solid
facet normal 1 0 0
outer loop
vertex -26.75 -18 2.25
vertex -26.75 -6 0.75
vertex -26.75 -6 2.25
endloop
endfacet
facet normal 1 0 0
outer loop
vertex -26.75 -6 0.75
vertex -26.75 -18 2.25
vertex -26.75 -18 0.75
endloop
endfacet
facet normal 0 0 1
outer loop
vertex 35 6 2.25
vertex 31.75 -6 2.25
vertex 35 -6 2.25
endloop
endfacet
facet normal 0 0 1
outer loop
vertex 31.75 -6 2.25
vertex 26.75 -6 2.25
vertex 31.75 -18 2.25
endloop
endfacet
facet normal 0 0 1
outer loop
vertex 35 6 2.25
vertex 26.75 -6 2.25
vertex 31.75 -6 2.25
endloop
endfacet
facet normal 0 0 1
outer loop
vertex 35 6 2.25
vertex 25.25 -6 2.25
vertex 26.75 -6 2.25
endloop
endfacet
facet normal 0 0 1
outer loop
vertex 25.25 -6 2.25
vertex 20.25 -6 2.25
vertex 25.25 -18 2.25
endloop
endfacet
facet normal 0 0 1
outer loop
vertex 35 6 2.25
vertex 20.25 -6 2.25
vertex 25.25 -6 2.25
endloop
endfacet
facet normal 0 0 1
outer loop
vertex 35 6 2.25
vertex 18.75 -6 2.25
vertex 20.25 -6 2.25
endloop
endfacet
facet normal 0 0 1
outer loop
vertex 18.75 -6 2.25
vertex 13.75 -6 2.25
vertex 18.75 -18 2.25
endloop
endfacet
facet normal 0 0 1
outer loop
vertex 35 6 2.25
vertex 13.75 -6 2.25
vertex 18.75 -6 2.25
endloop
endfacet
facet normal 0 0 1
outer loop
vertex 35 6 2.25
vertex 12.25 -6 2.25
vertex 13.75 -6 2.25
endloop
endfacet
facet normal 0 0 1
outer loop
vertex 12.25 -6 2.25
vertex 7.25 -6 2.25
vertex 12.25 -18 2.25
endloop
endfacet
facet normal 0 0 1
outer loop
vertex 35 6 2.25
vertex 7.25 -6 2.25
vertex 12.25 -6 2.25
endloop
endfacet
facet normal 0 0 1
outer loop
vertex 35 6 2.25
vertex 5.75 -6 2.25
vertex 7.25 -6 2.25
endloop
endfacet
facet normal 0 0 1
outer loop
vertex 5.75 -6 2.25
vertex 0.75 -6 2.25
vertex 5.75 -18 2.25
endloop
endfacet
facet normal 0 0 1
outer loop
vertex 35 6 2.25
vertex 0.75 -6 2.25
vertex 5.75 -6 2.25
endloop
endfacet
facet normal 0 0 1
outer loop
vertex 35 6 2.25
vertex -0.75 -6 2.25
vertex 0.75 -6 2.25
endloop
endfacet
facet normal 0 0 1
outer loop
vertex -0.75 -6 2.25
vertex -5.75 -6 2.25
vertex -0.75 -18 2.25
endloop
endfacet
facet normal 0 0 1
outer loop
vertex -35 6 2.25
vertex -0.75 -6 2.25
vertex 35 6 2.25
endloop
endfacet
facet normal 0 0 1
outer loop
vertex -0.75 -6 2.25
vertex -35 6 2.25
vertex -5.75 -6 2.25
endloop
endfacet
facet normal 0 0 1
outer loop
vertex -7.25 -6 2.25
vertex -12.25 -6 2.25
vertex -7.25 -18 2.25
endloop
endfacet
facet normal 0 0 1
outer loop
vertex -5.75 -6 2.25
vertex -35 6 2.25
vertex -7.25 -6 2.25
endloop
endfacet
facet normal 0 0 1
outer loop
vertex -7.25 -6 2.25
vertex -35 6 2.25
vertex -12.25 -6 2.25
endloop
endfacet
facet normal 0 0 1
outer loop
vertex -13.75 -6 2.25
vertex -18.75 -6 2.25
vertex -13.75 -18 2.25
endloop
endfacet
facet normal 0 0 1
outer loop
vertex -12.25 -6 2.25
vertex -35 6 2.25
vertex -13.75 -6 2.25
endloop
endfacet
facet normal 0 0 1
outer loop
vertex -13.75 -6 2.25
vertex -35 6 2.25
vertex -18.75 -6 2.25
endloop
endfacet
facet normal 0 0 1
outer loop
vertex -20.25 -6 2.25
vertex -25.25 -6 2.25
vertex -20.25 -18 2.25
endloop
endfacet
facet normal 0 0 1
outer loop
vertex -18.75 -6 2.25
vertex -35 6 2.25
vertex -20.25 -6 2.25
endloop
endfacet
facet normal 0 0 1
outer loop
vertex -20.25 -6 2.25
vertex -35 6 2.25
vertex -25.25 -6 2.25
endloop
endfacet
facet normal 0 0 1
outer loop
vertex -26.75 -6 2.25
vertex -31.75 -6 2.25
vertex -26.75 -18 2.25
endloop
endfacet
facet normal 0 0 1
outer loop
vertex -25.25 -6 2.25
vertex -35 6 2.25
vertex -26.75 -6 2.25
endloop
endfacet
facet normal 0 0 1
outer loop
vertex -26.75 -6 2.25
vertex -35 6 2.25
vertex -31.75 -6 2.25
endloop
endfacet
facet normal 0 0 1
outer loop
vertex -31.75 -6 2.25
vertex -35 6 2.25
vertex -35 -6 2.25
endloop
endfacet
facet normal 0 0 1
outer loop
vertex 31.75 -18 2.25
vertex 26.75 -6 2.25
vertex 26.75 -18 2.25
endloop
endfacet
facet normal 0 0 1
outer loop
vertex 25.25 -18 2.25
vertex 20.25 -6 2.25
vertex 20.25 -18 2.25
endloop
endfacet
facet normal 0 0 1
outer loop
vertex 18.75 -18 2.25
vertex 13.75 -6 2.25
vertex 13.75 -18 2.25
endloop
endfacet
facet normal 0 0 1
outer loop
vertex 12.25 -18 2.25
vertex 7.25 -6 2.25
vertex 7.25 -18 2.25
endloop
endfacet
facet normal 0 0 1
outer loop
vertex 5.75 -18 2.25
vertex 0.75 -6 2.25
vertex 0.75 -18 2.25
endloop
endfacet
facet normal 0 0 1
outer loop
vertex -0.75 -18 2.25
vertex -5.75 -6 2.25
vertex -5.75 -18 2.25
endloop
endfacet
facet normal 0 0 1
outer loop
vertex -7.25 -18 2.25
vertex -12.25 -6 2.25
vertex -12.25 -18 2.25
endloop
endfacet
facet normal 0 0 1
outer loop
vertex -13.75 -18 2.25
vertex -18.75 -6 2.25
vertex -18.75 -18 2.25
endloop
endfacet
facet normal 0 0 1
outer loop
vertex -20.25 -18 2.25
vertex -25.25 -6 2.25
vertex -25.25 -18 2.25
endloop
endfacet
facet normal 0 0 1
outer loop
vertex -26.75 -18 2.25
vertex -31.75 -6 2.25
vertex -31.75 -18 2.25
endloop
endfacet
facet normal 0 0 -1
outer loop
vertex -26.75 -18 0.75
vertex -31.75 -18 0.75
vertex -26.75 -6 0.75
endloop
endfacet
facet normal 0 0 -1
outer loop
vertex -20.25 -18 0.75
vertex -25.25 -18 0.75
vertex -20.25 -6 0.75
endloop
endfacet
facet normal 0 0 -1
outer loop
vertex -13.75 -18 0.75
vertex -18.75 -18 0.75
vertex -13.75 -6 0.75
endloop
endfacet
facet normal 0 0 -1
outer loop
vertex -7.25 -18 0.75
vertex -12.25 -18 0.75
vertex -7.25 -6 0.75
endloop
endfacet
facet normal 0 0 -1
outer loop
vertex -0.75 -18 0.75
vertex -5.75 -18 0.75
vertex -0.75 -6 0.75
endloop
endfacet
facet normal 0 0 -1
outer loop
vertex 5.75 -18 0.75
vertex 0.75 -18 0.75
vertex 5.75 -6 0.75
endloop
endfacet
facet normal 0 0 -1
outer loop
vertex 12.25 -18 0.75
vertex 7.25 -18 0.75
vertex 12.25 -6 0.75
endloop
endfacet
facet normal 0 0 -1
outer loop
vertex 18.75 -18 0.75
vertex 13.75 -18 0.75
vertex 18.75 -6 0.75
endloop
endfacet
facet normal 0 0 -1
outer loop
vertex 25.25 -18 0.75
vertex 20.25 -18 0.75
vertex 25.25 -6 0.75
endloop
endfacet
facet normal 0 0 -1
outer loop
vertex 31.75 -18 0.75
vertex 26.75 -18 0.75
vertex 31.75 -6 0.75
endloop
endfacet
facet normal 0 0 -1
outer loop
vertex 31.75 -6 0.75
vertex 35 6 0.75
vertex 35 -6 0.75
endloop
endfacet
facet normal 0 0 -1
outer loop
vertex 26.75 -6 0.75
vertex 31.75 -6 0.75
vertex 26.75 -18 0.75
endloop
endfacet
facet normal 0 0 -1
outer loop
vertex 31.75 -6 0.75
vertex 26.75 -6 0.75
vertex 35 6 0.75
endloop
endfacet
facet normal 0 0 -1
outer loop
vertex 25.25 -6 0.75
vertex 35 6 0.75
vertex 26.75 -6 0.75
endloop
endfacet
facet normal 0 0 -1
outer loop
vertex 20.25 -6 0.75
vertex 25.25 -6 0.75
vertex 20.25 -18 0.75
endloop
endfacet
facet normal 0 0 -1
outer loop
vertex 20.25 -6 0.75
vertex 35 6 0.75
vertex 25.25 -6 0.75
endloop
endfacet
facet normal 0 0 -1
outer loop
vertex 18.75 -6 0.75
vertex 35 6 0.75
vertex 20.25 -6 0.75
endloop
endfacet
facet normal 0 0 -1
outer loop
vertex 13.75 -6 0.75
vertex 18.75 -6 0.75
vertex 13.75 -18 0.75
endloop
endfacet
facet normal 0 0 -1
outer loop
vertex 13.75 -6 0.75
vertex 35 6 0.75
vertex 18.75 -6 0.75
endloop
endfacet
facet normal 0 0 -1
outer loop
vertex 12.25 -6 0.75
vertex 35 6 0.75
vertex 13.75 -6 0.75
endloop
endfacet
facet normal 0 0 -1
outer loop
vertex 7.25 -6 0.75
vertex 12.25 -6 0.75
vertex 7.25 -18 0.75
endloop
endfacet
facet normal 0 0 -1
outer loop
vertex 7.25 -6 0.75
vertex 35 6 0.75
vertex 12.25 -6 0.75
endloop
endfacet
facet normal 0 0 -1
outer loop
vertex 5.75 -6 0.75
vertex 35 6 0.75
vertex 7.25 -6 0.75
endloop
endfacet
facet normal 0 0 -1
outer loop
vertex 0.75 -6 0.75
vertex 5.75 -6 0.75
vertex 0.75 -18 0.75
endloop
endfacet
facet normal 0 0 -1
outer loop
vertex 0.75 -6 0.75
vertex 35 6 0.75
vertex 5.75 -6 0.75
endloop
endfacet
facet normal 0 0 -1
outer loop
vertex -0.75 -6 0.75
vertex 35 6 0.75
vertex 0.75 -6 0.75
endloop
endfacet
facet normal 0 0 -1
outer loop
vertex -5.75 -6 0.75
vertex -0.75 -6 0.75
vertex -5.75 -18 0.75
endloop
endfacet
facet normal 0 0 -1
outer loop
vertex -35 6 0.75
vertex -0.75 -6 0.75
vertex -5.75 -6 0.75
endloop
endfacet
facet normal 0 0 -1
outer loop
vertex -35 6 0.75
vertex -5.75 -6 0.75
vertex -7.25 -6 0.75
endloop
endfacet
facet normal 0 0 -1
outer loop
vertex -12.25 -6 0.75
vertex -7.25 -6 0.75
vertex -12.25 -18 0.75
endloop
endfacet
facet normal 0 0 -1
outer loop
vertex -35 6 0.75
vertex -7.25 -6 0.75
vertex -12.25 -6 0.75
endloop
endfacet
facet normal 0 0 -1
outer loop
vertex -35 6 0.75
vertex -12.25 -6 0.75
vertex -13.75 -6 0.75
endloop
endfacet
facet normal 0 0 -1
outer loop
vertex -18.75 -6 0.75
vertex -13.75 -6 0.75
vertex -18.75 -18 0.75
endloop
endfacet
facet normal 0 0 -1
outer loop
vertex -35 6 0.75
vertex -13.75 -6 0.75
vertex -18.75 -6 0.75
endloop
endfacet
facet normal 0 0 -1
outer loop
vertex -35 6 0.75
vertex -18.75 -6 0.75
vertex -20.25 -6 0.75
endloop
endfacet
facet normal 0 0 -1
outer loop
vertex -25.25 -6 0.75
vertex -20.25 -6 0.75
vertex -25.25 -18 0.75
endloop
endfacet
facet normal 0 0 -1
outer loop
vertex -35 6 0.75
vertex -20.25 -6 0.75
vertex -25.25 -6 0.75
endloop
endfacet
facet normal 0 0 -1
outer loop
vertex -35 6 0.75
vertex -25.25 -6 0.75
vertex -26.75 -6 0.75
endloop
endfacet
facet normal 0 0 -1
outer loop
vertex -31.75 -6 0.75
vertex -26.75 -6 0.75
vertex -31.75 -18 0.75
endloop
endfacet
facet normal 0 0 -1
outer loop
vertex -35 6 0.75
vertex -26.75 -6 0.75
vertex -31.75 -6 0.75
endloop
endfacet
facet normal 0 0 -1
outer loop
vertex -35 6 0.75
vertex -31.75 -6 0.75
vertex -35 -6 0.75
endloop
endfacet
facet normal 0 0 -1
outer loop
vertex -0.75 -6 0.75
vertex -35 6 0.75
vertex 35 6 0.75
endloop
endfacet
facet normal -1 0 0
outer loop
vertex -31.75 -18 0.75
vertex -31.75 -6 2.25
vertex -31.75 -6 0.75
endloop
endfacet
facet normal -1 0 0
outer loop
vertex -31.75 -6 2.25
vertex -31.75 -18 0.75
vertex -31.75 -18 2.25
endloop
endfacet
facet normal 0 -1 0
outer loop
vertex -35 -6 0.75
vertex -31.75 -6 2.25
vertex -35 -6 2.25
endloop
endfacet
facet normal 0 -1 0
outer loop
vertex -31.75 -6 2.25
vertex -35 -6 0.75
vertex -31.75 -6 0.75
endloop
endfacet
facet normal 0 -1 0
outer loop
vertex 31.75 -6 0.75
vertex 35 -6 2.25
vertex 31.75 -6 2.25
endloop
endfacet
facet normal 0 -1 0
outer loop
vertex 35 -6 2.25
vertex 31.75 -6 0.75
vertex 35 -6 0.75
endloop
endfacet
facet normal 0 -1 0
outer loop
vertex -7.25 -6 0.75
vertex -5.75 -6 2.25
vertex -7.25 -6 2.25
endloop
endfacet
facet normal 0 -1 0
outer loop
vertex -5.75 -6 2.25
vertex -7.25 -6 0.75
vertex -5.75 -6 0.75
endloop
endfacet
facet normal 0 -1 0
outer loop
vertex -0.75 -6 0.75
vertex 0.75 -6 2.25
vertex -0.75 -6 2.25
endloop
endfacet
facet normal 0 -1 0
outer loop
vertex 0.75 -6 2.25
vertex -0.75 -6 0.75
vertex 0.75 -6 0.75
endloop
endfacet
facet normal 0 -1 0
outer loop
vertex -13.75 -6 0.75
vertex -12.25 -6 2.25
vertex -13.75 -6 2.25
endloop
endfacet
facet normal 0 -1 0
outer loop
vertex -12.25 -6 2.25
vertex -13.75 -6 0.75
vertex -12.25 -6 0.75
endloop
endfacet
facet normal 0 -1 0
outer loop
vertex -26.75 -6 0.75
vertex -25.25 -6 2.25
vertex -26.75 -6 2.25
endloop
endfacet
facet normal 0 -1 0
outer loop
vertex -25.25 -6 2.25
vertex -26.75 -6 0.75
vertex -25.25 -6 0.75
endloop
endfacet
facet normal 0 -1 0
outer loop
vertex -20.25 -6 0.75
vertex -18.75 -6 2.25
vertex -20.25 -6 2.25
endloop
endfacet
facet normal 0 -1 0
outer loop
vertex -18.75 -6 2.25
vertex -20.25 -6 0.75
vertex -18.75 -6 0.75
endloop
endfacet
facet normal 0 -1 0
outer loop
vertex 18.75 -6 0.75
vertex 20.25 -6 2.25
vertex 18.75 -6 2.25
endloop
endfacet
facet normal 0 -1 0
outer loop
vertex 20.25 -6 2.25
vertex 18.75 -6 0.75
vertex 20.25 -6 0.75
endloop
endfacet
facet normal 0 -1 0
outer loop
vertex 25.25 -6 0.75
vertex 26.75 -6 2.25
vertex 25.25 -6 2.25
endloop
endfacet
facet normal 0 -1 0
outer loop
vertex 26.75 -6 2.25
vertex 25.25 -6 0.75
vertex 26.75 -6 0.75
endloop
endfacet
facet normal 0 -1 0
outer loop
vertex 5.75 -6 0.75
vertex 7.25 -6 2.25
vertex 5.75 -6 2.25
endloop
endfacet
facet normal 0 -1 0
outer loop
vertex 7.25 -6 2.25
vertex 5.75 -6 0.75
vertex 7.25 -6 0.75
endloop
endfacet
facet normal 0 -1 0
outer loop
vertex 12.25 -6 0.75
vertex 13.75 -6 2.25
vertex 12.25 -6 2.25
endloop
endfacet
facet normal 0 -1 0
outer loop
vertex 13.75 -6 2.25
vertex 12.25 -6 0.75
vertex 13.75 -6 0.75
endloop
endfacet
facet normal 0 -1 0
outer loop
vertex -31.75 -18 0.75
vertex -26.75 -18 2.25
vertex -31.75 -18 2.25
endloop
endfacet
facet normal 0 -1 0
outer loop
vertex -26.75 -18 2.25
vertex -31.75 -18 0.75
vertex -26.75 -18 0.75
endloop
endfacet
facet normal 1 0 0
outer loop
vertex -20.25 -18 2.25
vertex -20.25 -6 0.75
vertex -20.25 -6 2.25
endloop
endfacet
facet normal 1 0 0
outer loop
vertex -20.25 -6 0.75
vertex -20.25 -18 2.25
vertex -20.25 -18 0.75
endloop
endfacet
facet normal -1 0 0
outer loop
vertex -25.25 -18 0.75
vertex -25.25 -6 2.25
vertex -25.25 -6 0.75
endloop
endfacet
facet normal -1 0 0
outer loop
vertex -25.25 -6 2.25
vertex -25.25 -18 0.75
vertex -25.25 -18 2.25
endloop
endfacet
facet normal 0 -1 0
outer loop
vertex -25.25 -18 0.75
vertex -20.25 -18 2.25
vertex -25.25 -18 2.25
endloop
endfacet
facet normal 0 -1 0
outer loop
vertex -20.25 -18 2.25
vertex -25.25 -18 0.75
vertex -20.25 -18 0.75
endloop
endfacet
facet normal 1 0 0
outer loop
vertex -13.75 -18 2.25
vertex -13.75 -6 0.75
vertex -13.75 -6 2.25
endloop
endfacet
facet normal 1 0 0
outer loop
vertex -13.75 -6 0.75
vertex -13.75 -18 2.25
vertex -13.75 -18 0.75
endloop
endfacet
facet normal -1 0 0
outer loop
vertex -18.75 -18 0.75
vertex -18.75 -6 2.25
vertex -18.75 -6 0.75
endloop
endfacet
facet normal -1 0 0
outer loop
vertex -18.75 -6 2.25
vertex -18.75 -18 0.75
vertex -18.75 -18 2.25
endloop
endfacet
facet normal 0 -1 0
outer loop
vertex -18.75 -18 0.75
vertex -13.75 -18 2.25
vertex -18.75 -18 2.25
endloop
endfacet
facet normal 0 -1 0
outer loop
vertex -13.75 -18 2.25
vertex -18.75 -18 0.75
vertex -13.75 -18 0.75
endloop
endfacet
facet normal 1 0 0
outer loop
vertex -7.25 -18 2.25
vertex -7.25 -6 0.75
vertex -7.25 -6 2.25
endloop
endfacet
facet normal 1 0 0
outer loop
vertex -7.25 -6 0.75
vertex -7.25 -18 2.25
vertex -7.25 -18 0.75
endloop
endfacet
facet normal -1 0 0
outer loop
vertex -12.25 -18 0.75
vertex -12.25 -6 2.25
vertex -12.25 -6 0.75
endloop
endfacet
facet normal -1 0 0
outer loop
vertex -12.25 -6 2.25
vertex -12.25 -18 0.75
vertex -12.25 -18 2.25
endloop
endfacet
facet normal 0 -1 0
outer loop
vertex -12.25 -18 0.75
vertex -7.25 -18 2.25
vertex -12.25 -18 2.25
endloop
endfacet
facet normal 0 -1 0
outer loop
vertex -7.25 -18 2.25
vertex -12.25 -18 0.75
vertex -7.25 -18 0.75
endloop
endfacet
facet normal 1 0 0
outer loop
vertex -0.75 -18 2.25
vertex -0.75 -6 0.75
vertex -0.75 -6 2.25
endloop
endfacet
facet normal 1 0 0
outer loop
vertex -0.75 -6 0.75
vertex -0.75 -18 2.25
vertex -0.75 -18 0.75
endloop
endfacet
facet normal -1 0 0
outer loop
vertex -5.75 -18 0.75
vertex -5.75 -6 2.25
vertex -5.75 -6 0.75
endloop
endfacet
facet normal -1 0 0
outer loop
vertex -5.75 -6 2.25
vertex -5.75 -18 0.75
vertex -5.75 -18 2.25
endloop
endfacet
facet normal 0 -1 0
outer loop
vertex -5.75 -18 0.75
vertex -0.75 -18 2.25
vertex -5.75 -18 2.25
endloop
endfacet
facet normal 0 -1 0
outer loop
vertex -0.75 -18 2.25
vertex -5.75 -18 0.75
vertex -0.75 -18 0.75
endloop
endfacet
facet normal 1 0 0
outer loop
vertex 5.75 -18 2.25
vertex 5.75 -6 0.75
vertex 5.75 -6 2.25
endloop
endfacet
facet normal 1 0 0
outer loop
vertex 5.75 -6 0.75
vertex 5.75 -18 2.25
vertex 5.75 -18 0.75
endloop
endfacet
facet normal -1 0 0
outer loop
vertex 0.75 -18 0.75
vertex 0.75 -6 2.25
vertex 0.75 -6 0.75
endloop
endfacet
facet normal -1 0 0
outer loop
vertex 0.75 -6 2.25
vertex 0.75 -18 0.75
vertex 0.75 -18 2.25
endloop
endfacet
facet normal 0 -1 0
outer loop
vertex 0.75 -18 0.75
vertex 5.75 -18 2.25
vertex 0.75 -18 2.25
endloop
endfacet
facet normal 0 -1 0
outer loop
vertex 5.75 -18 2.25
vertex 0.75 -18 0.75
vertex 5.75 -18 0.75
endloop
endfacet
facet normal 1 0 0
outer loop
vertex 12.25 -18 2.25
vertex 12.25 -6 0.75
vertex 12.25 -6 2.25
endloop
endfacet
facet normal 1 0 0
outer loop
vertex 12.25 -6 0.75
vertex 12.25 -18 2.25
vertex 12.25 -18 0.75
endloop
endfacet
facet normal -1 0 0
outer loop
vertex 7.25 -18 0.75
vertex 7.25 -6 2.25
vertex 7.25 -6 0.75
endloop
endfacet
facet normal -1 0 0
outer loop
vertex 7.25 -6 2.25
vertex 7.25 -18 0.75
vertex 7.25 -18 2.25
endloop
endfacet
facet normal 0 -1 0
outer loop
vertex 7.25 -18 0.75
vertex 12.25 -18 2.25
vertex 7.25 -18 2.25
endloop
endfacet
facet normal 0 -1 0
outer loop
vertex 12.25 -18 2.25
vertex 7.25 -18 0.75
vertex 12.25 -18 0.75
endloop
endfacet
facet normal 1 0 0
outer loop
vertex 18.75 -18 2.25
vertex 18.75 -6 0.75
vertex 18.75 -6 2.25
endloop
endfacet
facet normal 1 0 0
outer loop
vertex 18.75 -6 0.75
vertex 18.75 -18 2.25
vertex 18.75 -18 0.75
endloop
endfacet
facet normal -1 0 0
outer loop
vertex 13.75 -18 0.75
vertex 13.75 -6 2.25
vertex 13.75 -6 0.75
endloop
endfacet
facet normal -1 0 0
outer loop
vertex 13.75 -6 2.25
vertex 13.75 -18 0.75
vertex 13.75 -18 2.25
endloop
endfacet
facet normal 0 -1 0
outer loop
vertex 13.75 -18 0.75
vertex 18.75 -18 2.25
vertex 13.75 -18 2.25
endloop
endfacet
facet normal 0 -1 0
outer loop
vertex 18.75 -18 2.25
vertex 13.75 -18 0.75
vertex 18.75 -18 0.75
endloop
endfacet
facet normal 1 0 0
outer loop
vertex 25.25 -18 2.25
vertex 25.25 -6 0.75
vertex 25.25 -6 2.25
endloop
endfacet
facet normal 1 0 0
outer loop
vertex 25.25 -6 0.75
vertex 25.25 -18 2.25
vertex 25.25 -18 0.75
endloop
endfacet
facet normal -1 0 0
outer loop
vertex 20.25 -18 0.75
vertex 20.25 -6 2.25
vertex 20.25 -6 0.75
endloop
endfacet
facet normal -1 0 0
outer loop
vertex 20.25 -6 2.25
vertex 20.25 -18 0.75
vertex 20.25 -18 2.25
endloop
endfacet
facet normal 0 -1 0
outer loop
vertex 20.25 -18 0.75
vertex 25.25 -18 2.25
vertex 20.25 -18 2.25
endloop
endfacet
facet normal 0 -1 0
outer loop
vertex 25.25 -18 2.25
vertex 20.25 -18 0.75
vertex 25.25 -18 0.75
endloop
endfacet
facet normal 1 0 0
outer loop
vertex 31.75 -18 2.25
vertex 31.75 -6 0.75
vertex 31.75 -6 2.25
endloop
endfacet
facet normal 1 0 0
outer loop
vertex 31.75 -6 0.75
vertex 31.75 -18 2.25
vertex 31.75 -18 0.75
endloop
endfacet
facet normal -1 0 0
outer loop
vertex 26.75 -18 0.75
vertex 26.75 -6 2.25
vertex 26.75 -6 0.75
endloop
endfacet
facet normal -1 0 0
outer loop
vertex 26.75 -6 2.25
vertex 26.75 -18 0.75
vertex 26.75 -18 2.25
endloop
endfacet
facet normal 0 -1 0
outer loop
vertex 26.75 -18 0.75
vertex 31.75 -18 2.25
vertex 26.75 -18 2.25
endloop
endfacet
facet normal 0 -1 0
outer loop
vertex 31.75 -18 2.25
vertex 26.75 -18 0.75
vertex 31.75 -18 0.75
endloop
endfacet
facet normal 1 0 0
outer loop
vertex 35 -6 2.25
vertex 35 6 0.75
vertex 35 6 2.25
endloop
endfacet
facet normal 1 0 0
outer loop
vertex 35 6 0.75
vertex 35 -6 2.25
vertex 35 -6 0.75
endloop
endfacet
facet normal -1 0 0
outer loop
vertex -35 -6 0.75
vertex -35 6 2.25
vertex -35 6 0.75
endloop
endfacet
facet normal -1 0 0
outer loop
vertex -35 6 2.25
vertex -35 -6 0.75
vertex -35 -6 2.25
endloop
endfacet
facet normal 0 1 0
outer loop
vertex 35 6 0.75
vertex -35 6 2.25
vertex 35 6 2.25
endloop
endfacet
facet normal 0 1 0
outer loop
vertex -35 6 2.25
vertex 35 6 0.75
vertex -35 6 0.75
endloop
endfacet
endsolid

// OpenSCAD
$fn = 64;

spine_length = 70;    // mm, length of the spine (X-axis)
spine_width = 12;    // mm, width of the spine (Y-axis)
tooth_width = 5.0;   // mm, width of each tooth (X-axis)
tooth_length = 12;    // mm, length of each tooth (Y-axis, extending from spine)
gap = 1.5;           // mm, gap between neighbouring teeth (X-axis)
num_teeth = 10;      // number of teeth
thickness = 1.5;     // mm, thickness of the comb (Z-axis)

total_teeth_width = num_teeth * tooth_width + (num_teeth - 1) * gap;
start_x = -total_teeth_width / 2;

// Shift the entire comb up by 0.75 mm so that the bottom is at z=0.
translate([0, 0, 0.75])
union() {
  // Spine: centered at origin in X and Y, placed at Z=0 (so from Z=0 to Z=thickness)
  translate([-spine_length/2, -spine_width/2, 0])
    cube([spine_length, spine_width, thickness]);
  
  // Teeth: 10 teeth, each 5.0mm x 12mm x 1.5mm, placed along the spine's bottom edge (Y = -spine_width/2 = -6) 
  // The teeth extend from Y = -spine_width/2 - tooth_length to Y = -spine_width/2.
  // So the top of the tooth (attached to the spine) is at Y = -spine_width/2 = -6.
  // Therefore, the translation for Y is -6 - tooth_length = -6 - 12 = -18.
  for (i = [0 : num_teeth - 1]) {
    x_pos = start_x + i * (tooth_width + gap);
    translate([x_pos, -18, 0])
      cube([tooth_width, tooth_length, thickness]);
  }
}
